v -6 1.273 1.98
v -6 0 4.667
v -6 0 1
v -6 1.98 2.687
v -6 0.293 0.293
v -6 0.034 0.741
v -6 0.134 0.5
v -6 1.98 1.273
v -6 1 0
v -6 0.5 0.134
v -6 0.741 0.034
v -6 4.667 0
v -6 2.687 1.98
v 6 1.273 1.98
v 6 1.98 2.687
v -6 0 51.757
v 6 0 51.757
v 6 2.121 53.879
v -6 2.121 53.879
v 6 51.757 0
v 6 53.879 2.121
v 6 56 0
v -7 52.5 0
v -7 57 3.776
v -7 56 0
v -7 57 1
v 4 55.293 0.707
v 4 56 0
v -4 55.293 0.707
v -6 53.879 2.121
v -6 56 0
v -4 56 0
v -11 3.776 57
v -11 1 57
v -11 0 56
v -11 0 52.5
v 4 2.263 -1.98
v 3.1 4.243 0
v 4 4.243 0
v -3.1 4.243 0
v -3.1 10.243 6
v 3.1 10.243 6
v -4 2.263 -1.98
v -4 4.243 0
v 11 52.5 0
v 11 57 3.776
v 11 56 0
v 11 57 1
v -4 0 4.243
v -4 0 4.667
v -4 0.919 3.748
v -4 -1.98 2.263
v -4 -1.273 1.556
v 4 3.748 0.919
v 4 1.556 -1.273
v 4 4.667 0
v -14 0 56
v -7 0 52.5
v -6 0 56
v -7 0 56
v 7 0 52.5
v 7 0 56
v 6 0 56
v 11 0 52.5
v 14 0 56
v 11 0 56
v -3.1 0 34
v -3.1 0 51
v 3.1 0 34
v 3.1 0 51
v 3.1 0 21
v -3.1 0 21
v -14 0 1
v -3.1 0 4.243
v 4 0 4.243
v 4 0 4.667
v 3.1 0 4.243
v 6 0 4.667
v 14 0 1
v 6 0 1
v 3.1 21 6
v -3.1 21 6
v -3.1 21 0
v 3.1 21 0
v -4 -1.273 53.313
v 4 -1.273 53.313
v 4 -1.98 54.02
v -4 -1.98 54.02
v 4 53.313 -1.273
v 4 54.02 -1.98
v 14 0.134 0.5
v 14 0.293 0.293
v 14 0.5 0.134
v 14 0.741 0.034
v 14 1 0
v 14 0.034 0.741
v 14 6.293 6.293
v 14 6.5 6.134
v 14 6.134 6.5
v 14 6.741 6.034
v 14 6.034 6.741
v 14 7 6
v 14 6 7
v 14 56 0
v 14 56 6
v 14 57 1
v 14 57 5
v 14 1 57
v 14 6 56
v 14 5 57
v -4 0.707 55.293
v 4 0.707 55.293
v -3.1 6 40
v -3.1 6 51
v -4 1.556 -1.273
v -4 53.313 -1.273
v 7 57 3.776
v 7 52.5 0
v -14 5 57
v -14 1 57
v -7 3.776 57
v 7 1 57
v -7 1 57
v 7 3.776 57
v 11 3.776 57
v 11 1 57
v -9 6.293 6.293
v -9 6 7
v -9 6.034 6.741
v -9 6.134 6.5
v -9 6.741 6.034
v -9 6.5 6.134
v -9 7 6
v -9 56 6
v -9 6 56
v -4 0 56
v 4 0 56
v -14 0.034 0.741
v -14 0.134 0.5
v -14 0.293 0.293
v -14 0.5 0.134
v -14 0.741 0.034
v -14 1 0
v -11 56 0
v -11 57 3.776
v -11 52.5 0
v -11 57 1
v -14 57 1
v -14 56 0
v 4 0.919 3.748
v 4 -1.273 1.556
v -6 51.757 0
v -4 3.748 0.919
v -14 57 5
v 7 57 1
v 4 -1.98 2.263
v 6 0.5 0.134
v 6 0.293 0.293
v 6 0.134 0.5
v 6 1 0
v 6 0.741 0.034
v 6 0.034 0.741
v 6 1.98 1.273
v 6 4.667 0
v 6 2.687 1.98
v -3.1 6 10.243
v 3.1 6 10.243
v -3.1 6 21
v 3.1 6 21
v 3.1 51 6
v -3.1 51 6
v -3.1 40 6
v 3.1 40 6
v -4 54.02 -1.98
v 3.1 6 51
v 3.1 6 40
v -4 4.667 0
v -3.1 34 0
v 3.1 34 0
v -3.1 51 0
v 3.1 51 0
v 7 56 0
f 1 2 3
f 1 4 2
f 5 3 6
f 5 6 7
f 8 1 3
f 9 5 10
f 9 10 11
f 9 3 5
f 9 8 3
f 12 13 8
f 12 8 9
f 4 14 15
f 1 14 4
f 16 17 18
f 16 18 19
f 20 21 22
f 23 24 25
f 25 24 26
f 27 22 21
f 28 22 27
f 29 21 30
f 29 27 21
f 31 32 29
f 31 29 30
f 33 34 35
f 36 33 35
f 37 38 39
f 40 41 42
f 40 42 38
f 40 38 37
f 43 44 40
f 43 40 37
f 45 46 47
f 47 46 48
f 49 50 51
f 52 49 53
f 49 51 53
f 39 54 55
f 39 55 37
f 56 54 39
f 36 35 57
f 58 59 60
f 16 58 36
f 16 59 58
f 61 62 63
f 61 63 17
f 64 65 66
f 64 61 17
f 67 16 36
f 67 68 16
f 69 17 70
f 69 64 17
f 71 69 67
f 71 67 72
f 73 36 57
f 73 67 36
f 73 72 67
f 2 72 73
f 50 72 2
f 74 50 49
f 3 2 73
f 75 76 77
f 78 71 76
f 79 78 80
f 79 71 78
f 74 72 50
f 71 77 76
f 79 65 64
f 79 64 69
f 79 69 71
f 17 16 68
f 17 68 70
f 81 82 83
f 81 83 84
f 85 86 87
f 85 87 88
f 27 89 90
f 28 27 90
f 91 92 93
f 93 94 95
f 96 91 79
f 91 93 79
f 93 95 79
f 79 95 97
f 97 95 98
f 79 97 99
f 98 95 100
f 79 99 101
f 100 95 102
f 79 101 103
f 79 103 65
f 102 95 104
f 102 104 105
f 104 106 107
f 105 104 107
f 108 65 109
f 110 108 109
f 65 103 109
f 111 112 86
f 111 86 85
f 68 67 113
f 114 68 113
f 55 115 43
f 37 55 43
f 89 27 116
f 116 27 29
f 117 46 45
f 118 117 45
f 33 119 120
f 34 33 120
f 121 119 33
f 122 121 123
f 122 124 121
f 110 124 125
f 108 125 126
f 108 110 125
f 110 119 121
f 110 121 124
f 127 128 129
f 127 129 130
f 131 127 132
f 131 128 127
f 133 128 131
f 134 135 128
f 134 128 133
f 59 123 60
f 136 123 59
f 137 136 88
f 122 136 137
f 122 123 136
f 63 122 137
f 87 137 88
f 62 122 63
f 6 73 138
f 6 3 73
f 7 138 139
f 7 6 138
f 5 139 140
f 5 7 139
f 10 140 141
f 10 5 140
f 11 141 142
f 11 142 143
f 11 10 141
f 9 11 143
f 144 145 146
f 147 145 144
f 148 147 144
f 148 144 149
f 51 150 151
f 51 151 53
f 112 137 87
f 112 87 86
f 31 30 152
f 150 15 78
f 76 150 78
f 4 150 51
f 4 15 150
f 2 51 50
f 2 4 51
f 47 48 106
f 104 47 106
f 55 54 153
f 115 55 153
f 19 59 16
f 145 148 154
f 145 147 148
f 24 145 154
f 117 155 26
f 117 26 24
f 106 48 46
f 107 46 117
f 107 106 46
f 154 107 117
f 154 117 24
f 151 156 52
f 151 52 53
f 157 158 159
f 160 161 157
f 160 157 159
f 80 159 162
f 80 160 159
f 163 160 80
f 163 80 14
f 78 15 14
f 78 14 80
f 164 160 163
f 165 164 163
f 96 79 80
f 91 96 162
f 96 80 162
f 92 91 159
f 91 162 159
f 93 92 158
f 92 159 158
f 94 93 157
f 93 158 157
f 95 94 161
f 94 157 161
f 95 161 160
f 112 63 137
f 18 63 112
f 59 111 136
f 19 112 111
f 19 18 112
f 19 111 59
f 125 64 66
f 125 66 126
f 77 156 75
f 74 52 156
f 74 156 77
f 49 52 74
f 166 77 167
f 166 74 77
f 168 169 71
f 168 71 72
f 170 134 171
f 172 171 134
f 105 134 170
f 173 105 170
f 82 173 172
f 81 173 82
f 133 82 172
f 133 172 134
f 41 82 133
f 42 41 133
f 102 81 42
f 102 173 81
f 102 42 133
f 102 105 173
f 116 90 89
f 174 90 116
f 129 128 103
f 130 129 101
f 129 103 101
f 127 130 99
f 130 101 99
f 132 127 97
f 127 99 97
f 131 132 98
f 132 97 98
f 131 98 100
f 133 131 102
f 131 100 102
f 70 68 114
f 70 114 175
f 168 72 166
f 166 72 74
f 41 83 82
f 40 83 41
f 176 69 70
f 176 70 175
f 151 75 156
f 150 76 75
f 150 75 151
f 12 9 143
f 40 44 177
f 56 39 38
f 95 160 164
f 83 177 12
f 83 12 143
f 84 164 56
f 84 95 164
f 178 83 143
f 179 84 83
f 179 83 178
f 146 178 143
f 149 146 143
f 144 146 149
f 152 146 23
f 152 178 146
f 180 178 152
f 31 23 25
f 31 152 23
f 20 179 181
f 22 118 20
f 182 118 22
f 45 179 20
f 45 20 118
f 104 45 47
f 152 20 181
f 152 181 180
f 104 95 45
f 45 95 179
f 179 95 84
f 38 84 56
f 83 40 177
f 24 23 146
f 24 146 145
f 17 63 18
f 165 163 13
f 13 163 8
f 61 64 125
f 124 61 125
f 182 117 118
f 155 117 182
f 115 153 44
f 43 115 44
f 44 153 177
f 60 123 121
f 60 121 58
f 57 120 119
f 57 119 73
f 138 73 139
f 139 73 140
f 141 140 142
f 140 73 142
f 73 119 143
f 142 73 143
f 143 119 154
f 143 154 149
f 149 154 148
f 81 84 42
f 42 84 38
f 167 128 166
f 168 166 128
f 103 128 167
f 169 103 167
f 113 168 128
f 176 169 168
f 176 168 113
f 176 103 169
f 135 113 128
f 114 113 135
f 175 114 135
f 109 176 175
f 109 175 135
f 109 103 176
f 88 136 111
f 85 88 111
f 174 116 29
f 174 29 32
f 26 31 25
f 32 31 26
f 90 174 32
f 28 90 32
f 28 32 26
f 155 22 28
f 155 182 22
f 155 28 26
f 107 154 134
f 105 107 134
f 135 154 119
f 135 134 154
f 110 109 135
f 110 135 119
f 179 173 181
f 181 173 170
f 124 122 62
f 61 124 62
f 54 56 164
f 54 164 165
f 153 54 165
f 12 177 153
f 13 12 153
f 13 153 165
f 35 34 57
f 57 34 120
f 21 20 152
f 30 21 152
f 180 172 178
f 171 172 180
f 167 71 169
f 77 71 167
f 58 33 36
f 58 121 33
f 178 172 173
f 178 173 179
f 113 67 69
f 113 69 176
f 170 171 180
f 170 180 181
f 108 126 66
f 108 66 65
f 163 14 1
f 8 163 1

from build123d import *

# Parameters (mm, degrees)
BOSS_EXTRUDE1_DEPTH  = 8
BOSS_EXTRUDE2_DEPTH  = 2
BOSS_EXTRUDE3_DEPTH  = 5
BOSS_EXTRUDE4_DEPTH  = 3
CUT_EXTRUDE1_DEPTH   = 4
CUT_EXTRUDE2_DEPTH   = 4
BOSS_EXTRUDE5_DEPTH  = 2
BOSS_EXTRUDE6_DEPTH  = 1
BOSS_EXTRUDE7_DEPTH  = 2
BOSS_EXTRUDE8_DEPTH  = 2
CUT_EXTRUDE3_DEPTH   = 1
CUT_EXTRUDE4_DEPTH   = 1
CUT_EXTRUDE5_DEPTH   = 1
CUT_EXTRUDE6_DEPTH   = 1
SKETCH15_W           = 8
SKETCH15_H           = 3.1
CUT_EXTRUDE7_DEPTH   = 4
SKETCH16_W           = 12
SKETCH16_H           = 3
CUT_EXTRUDE8_DEPTH   = 3
SKETCH17_W           = 12
SKETCH17_H           = 3
CUT_EXTRUDE9_DEPTH   = 3
SKETCH18_W           = 6.2
SKETCH18_H           = 6
CUT_EXTRUDE10_DEPTH  = 10.757359313
SKETCH19_W           = 6.2
SKETCH19_H           = 6
CUT_EXTRUDE11_DEPTH  = 10.757359313
BOSS_EXTRUDE9_DEPTH  = 3
SKETCH21_W           = 6.2
SKETCH21_H           = 11
CUT_EXTRUDE12_DEPTH  = 78.756028705
SKETCH22_W           = 6.2
SKETCH22_H           = 11
CUT_EXTRUDE13_DEPTH  = 82.816868676
SKETCH23_W           = 8
SKETCH23_H           = 1
BOSS_EXTRUDE10_DEPTH = 2.8
SKETCH24_W           = 8
SKETCH24_H           = 1
BOSS_EXTRUDE11_DEPTH = 2.8
DRAFT1_START         = -3.1
DRAFT1_DEPTH         = 6.2
DRAFT1_START_2       = -4
DRAFT1_2_DEPTH       = 8
DRAFT2_START         = -3.1
DRAFT2_DEPTH         = 6.2
DRAFT2_START_2       = -4
DRAFT2_2_DEPTH       = 8
RIB1_REACH           = 83.817
SKETCH25_WALL_W      = 177.633737352
SKETCH25_WALL_H      = 1
CHAMFER1_SIZE        = 1
FILLET1_R            = 1


# Read off the part's stored shape, not the designer's step: Draft1, Draft2
with BuildPart() as part:
    # Sketch1 → Boss-Extrude1 (new body)
    with BuildSketch(Plane(origin=(4, 0, 0), x_dir=(0, 0, -1), z_dir=(1, 0, 0))):
        Polygon((-51.757359313, 0), (-10.242640687, 0), (-10.242640687, -9.959797975), (9.959797975, 10.242640687), (0, 10.242640687), (0, 51.757359313), (2.121320344, 53.878679656), (-1, 57), (-5, 57), (-6, 56), (-6, 6), (-56, 6), (-57, 5), (-57, 1), (-53.878679656, -2.121320344), align=None)
    extrude(amount=-BOSS_EXTRUDE1_DEPTH)

    # Sketch2 → Boss-Extrude2 (add)
    with BuildSketch(Plane(origin=(4, 0, 0), x_dir=(0, 0, -1), z_dir=(1, 0, 0))):
        Polygon((0, 4.666904756), (-4.666904756, 0), (-51.757359313, 0), (-53.878679656, -2.121320344), (-57, 1), (-57, 5), (-56, 6), (-6, 6), (-6, 56), (-5, 57), (-1, 57), (2.121320344, 53.878679656), (0, 51.757359313), align=None)
    extrude(amount=BOSS_EXTRUDE2_DEPTH)

    # Sketch3 → Boss-Extrude3 (add)
    with BuildSketch(Plane(origin=(6, 0, 0), x_dir=(0, 0, -1), z_dir=(1, 0, 0))):
        Polygon((-51.757359313, 0), (-53.878679656, -2.121320344), (-57, 1), (-57, 5), (-56, 6), (-6, 6), (-6, 56), (-5, 57), (-1, 57), (2.121320344, 53.878679656), (0, 51.757359313), (0, 0), align=None)
    extrude(amount=BOSS_EXTRUDE3_DEPTH)

    # Sketch4 → Boss-Extrude4 (add)
    with BuildSketch(Plane(origin=(11, 0, 0), x_dir=(0, 0, -1), z_dir=(1, 0, 0))):
        Polygon((-5, 57), (0, 57), (0, 0), (-57, 0), (-57, 5), (-56, 6), (-6, 6), (-6, 56), align=None)
    extrude(amount=BOSS_EXTRUDE4_DEPTH)

    # Sketch5 → Cut-Extrude1 (cut)
    with BuildSketch(Plane(origin=(11, 0, 0), x_dir=(0, 0, -1), z_dir=(1, 0, 0))):
        Polygon((-1, 57), (-3.77594834, 57), (0, 52.5), (0, 51.757359313), (2.121320344, 53.878679656), align=None)
    extrude(amount=-CUT_EXTRUDE1_DEPTH, mode=Mode.SUBTRACT)

    # Sketch6 → Cut-Extrude2 (cut)
    with BuildSketch(Plane(origin=(11, 0, 0), x_dir=(0, 0, -1), z_dir=(1, 0, 0))):
        Polygon((-57, 3.77594834), (-57, 1), (-53.878679656, -2.121320344), (-51.757359313, 0), (-52.5, 0), align=None)
    extrude(amount=-CUT_EXTRUDE2_DEPTH, mode=Mode.SUBTRACT)

    # Sketch7 → Boss-Extrude5 (add)
    with BuildSketch(Plane.ZY.offset(4)):
        Polygon((51.757359313, 0), (4.666904756, 0), (0, 4.666904756), (0, 51.757359313), (-2.121320344, 53.878679656), (1, 57), (5, 57), (6, 56), (6, 6), (56, 6), (57, 5), (57, 1), (53.878679656, -2.121320344), align=None)
    extrude(amount=BOSS_EXTRUDE5_DEPTH)

    # Sketch8 → Boss-Extrude6 (add)
    with BuildSketch(Plane.ZY.offset(6)):
        Polygon((0, 51.757359313), (-2.121320344, 53.878679656), (1, 57), (5, 57), (6, 56), (6, 6), (56, 6), (57, 5), (57, 1), (53.878679656, -2.121320344), (51.757359313, 0), (0, 0), align=None)
    extrude(amount=BOSS_EXTRUDE6_DEPTH)

    # Sketch9 → Boss-Extrude7 (add)
    with BuildSketch(Plane.ZY.offset(7)):
        Polygon((5, 57), (6, 56), (6, 6), (56, 6), (57, 5), (57, 3.77594834), (52.5, 0), (0, 0), (0, 52.5), (3.77594834, 57), align=None)
    extrude(amount=BOSS_EXTRUDE7_DEPTH)

    # Sketch10 → Boss-Extrude8 (add)
    with BuildSketch(Plane.ZY.offset(9)):
        Polygon((0, 0), (0, 52.5), (3.77594834, 57), (5, 57), (57, 5), (57, 3.77594834), (52.5, 0), align=None)
    extrude(amount=BOSS_EXTRUDE8_DEPTH)

    # Sketch11 → Cut-Extrude3 (cut)
    with BuildSketch(Plane.ZY.offset(7)):
        Polygon((53.878679656, -2.121320344), (56, 0), (51.757359313, 0), align=None)
    extrude(amount=-CUT_EXTRUDE3_DEPTH, mode=Mode.SUBTRACT)

    # Sketch12 → Cut-Extrude4 (cut)
    with BuildSketch(Plane(origin=(7, 0, 0), x_dir=(0, 0, -1), z_dir=(1, 0, 0))):
        Polygon((-51.757359313, 0), (-56, 0), (-53.878679656, -2.121320344), align=None)
    extrude(amount=-CUT_EXTRUDE4_DEPTH, mode=Mode.SUBTRACT)

    # Sketch13 → Cut-Extrude5 (cut)
    with BuildSketch(Plane(origin=(7, 0, 0), x_dir=(0, 0, -1), z_dir=(1, 0, 0))):
        Polygon((0, 56), (0, 51.757359313), (2.121320344, 53.878679656), align=None)
    extrude(amount=-CUT_EXTRUDE5_DEPTH, mode=Mode.SUBTRACT)

    # Sketch14 → Cut-Extrude6 (cut)
    with BuildSketch(Plane.ZY.offset(7)):
        Polygon((-2.121320344, 53.878679656), (0, 51.757359313), (0, 56), align=None)
    extrude(amount=-CUT_EXTRUDE6_DEPTH, mode=Mode.SUBTRACT)

    # Sketch15 → Cut-Extrude7 (cut)
    with BuildSketch(Plane(origin=(0, 1.414213562, -1.414213562), x_dir=(-1, 0, 0), z_dir=(0, 0.7071067811865474, -0.7071067811865477))):
        with Locations((0, 1.75)):
            Rectangle(SKETCH15_W, SKETCH15_H)
    extrude(amount=-CUT_EXTRUDE7_DEPTH, mode=Mode.SUBTRACT)

    # Sketch16 → Cut-Extrude8 (cut)
    with BuildSketch(Plane(origin=(0, 25.878679656, 25.878679656), x_dir=(-1, 0, 0), z_dir=(0, -0.707106781186546, -0.7071067811865491))):
        with Locations((0, 38.097979746)):
            Rectangle(SKETCH16_W, SKETCH16_H)
    extrude(amount=-CUT_EXTRUDE8_DEPTH, mode=Mode.SUBTRACT)

    # Sketch17 → Cut-Extrude9 (cut)
    with BuildSketch(Plane(origin=(0, 25.878679656, 25.878679656), x_dir=(-1, 0, 0), z_dir=(0, -0.7071067811865469, -0.7071067811865481))):
        with Locations((0, -38.097979746)):
            Rectangle(SKETCH17_W, SKETCH17_H)
    extrude(amount=-CUT_EXTRUDE9_DEPTH, mode=Mode.SUBTRACT)

    # Sketch18 → Cut-Extrude10 (cut)
    with BuildSketch(Plane.XZ.offset(-10.242640687)):
        with Locations((0, 3)):
            Rectangle(SKETCH18_W, SKETCH18_H)
    extrude(amount=-CUT_EXTRUDE10_DEPTH, mode=Mode.SUBTRACT)

    # Sketch19 → Cut-Extrude11 (cut)
    with BuildSketch(Plane(origin=(0, 0, 10.242640687), x_dir=(-1, 0, 0), z_dir=(0, 0, -1))):
        with Locations((0, 3)):
            Rectangle(SKETCH19_W, SKETCH19_H)
    extrude(amount=-CUT_EXTRUDE11_DEPTH, mode=Mode.SUBTRACT)

    # Sketch20 → Boss-Extrude9 (add)
    with BuildSketch(Plane.ZY.offset(11)):
        Polygon((57, 0), (0, 0), (0, 57), (5, 57), (57, 5), align=None)
    extrude(amount=BOSS_EXTRUDE9_DEPTH)

    # Sketch21 → Cut-Extrude12 (cut, through all)
    with BuildSketch(Plane.XY.offset(6)):
        with Locations((0, 45.5)):
            Rectangle(SKETCH21_W, SKETCH21_H)
    extrude(amount=-CUT_EXTRUDE12_DEPTH, mode=Mode.SUBTRACT)

    # Sketch22 → Cut-Extrude13 (cut, through all)
    with BuildSketch(Plane.XZ):
        with Locations((0, 45.5)):
            Rectangle(SKETCH22_W, SKETCH22_H)
    extrude(amount=-CUT_EXTRUDE13_DEPTH, mode=Mode.SUBTRACT)

    # Sketch23 → Boss-Extrude10 (add)
    with BuildSketch(Plane(origin=(0, 28, 28), x_dir=(-1, 0, 0), z_dir=(0, -0.7071067811865448, -0.7071067811865503))):
        with Locations((0, 39.097979746)):
            Rectangle(SKETCH23_W, SKETCH23_H)
    extrude(amount=BOSS_EXTRUDE10_DEPTH)

    # Sketch24 → Boss-Extrude11 (add)
    with BuildSketch(Plane(origin=(0, 28, 28), x_dir=(-1, 0, 0), z_dir=(0, -0.7071067811865471, -0.7071067811865479))):
        with Locations((0, -39.097979746)):
            Rectangle(SKETCH24_W, SKETCH24_H)
    extrude(amount=BOSS_EXTRUDE11_DEPTH)

    # Draft1 outline → Draft1 (cut)
    with BuildSketch(Plane.YZ.offset(DRAFT1_START)):
        Polygon((0, 40), (0, 34), (6, 40), align=None)
        Polygon((6, 10.242640687), (-9.959797975, 10.242640687), (-1.979898987, 2.2627417), align=None)
    extrude(amount=DRAFT1_DEPTH, mode=Mode.SUBTRACT)

    # Draft1 2 outline → Draft1 2 (cut)
    with BuildSketch(Plane.YZ.offset(DRAFT1_START_2)):
        Polygon((-1.979898987, 2.2627417), (0, 4.242640687), (0, 10.242640687), (-9.959797975, 10.242640687), align=None)
    extrude(amount=DRAFT1_2_DEPTH, mode=Mode.SUBTRACT)

    # Draft2 outline → Draft2 (cut)
    with BuildSketch(Plane.YZ.offset(DRAFT2_START)):
        Polygon((40, 6), (34, 0), (40, 0), align=None)
        Polygon((2.2627417, -1.979898987), (10.242640687, -9.959797975), (10.242640687, 6), align=None)
    extrude(amount=DRAFT2_DEPTH, mode=Mode.SUBTRACT)

    # Draft2 2 outline → Draft2 2 (cut)
    with BuildSketch(Plane.YZ.offset(DRAFT2_START_2)):
        Polygon((4.242640687, 0), (2.2627417, -1.979898987), (10.242640687, -9.959797975), (10.242640687, 0), align=None)
    extrude(amount=DRAFT2_2_DEPTH, mode=Mode.SUBTRACT)

    # Sketch25 wall → Rib1 (add, up to next)
    with BuildSketch(Plane(origin=(0, 1.626345597, 1.626345597), x_dir=(-1, 0, 0), z_dir=(0, 0.707106781187, 0.707106781187)), mode=Mode.PRIVATE) as rib1_sk1:
        Rectangle(SKETCH25_WALL_W, SKETCH25_WALL_H)
    rib1_tool1 = extrude(rib1_sk1.sketch, amount=RIB1_REACH, mode=Mode.PRIVATE) - part.part
    add(rib1_tool1.solids().sort_by_distance((0, 1.626345597, 1.626345597))[0])

    # Chamfer1
    chamfer1_edges = [part.edges().sort_by_distance(p)[0] for p in [
        (12.5, 57, 0),
        (-12.5, 57, 0),
        (-12.5, 0, 57),
        (12.5, 0, 57),
    ]]
    chamfer(chamfer1_edges, length=CHAMFER1_SIZE)

    # Fillet1
    fillet1_edges = [part.edges().sort_by_distance(p)[0] for p in [
        (2.5, 6, 6),
        (-10, 0, 0),
        (10, 0, 0),
    ]]
    fillet(fillet1_edges, radius=FILLET1_R)


solid = part.part
